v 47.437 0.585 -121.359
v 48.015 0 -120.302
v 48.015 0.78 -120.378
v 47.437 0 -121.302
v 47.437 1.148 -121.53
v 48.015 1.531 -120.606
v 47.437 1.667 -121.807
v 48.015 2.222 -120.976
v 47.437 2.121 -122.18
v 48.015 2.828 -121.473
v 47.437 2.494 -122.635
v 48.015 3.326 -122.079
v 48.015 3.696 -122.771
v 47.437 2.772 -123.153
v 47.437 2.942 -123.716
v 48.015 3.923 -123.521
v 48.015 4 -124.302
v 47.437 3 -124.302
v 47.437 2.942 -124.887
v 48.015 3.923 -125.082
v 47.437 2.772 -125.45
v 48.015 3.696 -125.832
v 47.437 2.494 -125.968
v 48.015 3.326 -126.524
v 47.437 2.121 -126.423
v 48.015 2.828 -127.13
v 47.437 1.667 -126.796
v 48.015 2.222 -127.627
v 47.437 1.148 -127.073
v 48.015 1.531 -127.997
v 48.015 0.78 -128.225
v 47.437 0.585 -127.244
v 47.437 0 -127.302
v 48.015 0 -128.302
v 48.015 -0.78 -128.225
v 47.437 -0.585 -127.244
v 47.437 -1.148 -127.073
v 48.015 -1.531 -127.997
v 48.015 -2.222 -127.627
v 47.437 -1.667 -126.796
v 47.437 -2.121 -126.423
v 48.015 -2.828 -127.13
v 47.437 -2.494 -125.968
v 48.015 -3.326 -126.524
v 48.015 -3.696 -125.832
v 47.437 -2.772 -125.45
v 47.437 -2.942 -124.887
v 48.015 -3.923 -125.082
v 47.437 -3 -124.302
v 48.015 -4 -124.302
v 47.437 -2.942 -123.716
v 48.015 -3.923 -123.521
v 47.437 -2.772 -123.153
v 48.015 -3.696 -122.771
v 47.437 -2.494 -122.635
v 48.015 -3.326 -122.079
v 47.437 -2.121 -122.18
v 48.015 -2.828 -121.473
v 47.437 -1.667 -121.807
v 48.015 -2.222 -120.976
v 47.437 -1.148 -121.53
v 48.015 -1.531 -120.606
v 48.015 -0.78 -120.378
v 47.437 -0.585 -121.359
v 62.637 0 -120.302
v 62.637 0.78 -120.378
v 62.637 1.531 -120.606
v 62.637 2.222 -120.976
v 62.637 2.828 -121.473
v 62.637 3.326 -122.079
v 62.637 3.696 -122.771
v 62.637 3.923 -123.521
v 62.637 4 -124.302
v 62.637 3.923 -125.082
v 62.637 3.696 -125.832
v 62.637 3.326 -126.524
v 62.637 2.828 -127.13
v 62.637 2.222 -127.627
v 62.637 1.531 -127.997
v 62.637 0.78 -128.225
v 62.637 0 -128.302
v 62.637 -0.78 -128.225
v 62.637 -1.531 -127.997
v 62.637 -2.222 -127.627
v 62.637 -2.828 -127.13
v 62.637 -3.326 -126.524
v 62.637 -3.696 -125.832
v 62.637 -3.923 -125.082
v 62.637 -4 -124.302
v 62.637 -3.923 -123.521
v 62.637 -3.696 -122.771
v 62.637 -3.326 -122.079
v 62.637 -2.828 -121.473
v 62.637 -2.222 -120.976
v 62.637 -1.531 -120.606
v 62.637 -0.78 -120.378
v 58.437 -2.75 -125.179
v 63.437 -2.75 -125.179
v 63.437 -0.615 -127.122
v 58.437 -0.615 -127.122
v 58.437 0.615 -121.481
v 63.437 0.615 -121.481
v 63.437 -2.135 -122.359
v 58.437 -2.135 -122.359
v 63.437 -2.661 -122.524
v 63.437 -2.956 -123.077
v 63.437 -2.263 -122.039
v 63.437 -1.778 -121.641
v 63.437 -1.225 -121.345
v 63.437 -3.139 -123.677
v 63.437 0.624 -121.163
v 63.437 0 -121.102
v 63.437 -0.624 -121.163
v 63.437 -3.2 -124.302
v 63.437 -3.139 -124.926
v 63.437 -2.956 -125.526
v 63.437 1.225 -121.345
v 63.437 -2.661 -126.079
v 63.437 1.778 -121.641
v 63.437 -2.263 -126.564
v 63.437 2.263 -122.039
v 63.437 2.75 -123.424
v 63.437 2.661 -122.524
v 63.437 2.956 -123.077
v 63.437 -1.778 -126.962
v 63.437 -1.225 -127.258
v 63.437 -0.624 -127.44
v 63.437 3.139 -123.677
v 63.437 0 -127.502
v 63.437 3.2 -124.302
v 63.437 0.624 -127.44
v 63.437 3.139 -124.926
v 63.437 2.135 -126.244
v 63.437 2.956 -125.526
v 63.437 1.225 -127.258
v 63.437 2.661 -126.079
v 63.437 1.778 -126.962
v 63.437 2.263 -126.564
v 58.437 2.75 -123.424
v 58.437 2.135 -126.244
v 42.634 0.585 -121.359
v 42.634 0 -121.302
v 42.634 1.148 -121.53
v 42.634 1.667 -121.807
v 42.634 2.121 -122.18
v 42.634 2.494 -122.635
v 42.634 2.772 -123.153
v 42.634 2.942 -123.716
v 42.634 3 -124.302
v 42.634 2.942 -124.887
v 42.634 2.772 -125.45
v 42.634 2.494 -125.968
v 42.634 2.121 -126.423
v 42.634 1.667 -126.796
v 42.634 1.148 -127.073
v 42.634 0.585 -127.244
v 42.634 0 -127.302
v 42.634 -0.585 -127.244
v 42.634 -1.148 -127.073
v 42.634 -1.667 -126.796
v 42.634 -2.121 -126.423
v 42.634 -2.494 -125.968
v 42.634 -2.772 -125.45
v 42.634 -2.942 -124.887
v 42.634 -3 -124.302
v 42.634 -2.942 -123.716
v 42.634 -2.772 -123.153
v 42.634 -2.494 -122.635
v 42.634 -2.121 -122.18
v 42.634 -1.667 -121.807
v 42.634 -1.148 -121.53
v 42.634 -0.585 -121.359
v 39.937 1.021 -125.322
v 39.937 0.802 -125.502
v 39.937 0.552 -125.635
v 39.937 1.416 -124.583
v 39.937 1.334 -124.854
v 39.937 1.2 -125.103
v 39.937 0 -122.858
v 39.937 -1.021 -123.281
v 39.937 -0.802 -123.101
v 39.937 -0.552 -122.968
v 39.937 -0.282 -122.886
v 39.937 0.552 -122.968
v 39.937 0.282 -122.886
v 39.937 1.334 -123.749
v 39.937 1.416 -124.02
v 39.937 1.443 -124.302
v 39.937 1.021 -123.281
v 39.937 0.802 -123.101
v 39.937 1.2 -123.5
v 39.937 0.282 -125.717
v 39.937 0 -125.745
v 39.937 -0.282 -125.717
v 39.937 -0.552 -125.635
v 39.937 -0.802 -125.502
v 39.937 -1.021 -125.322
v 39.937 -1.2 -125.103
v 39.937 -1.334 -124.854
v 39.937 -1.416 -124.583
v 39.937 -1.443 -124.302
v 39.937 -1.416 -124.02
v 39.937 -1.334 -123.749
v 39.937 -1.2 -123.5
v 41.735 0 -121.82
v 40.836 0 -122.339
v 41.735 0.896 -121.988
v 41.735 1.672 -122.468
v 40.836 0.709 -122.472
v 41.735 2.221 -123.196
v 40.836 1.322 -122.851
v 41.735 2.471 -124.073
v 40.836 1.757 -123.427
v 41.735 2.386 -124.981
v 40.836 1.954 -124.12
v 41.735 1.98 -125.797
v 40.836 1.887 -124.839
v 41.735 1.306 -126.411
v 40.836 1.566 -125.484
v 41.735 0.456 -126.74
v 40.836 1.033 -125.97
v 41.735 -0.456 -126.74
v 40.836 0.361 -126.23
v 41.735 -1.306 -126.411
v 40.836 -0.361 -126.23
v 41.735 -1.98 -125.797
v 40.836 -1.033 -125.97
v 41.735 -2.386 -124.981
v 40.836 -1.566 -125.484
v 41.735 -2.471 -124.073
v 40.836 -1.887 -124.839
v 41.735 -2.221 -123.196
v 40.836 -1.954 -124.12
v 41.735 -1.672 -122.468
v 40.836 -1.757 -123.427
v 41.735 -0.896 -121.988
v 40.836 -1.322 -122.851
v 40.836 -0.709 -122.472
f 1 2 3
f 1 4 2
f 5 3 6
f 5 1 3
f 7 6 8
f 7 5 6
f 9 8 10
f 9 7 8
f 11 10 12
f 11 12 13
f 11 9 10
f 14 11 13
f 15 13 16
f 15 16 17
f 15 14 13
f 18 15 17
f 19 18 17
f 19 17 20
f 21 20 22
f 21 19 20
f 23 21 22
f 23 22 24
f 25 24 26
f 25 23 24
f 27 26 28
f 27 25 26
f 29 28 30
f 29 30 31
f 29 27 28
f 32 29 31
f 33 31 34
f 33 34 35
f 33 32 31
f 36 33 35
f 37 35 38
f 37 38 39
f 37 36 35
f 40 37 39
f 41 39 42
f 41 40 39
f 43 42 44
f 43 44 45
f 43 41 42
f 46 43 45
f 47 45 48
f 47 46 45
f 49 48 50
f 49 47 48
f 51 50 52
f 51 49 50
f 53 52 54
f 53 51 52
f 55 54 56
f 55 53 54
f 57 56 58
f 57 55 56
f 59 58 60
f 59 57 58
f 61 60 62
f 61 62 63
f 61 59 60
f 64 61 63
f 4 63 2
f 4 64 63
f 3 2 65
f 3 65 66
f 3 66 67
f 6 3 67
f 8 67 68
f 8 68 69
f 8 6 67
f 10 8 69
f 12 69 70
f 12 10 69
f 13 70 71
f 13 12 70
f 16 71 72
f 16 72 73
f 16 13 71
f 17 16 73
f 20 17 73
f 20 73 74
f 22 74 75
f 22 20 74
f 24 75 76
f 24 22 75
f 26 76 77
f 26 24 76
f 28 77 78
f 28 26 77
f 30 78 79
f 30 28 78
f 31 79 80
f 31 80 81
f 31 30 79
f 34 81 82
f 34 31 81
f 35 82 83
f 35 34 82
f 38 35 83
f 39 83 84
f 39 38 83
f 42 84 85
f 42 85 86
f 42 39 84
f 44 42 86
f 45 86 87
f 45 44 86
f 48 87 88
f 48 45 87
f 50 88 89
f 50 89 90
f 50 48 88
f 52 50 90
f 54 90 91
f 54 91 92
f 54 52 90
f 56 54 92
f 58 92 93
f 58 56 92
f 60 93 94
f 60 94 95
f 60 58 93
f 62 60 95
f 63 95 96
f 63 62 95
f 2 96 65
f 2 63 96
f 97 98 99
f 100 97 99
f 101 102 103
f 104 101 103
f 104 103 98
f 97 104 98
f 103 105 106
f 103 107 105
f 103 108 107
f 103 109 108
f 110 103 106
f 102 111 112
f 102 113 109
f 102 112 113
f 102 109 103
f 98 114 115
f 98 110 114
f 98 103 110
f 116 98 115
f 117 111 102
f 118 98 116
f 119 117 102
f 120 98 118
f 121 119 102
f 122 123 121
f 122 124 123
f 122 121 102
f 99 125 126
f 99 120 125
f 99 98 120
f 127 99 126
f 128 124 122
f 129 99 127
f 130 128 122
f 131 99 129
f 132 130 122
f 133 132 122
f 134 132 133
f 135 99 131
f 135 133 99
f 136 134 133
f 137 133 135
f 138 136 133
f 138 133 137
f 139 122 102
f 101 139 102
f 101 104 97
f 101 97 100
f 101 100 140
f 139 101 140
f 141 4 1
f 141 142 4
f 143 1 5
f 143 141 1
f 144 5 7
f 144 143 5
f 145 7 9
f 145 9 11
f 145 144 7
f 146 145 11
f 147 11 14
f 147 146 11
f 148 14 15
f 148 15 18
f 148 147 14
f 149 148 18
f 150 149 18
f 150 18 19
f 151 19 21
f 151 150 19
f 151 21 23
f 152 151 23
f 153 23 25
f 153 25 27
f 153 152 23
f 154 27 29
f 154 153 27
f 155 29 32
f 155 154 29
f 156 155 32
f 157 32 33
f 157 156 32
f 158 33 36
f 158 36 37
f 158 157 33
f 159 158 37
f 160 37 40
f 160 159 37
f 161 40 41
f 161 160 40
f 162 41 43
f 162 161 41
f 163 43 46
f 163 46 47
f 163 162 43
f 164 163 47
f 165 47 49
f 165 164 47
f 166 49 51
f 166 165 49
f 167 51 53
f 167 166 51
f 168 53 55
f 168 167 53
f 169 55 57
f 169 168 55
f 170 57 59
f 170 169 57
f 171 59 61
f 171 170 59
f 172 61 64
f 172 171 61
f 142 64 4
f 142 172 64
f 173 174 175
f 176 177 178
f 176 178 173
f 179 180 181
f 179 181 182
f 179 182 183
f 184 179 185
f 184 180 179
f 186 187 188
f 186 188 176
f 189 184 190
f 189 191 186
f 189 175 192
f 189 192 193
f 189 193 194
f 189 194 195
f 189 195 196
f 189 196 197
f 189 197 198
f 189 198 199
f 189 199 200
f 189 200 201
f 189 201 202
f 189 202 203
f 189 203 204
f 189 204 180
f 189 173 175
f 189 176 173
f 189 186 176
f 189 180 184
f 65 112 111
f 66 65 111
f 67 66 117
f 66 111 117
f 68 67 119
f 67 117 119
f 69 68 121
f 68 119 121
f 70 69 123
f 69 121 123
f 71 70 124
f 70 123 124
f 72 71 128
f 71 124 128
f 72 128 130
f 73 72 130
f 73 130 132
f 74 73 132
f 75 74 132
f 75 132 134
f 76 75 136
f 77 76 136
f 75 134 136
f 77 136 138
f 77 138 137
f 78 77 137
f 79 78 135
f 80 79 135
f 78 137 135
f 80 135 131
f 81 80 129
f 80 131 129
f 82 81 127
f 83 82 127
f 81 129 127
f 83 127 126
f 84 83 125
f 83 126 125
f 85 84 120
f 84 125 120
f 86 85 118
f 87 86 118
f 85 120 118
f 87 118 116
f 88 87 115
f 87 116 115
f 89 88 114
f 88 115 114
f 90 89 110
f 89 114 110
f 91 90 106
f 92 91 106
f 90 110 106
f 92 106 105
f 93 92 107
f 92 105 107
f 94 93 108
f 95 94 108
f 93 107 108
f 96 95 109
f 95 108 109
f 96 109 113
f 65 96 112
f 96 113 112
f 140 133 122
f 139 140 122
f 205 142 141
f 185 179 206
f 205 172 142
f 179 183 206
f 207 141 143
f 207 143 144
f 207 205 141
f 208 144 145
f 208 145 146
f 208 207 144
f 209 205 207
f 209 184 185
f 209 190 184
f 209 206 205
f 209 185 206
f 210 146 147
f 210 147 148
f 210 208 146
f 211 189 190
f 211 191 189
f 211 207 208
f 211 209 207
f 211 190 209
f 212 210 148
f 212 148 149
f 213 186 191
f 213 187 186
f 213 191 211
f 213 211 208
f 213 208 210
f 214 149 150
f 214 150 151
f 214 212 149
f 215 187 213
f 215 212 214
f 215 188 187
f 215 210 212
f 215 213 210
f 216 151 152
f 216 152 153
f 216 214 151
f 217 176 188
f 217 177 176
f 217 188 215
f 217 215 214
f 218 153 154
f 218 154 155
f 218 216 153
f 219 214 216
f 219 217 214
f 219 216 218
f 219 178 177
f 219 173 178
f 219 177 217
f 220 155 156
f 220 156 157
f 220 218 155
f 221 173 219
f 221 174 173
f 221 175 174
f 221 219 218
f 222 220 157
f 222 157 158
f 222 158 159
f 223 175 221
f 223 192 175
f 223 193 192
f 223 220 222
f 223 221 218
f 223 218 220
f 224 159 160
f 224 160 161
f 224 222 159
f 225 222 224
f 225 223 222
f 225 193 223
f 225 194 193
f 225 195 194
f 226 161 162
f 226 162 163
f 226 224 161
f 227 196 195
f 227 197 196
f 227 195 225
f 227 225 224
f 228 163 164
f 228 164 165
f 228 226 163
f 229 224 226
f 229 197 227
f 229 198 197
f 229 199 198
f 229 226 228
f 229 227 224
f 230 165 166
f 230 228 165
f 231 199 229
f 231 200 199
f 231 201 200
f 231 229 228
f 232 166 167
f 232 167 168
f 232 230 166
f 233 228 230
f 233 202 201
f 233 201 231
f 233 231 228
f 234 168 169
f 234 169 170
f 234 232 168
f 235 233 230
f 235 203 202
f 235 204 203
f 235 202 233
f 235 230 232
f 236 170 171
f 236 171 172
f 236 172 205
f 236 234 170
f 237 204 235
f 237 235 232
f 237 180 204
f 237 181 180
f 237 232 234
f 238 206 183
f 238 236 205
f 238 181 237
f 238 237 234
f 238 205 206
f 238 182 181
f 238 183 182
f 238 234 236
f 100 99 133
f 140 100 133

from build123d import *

# Parameters (mm, degrees)
F3_DEPTH = 5
F4_SIZE  = 0.8


with BuildPart() as f1:
    # F0 (on Front) → F1 (revolve)
    with BuildSketch(Plane.XZ):
        Polygon((42.6336441377, -121.3015150939), (39.937491715, -122.8581394209), (39.937491715, -124.3015150939), (63.437491715, -124.3015150939), (63.437491715, -120.3015150939), (48.0148419841, -120.3015150939), (47.437491715, -121.3015150939), align=None)
    revolve(axis=Axis((51.687491715, 0, -124.3015150939), (-1, 0, 0)))

    # F2 (on face) → F3 (cut)
    with BuildSketch(Plane.YZ.offset(63.437491715)):
        Polygon((2.7500788948, -123.423791102), (0.6149081729, -121.4810149127), (-2.1351707219, -122.3587389045), (-2.7500788948, -125.1792390858), (-0.6149081729, -127.1220152751), (2.1351707219, -126.2442912832), align=None)
    extrude(amount=-F3_DEPTH, mode=Mode.SUBTRACT)

    # F4
    f4_edges = [f1.edges().sort_by_distance(p)[0] for p in [
        (63.437492, 0, -128.301515),
    ]]
    chamfer(f4_edges, length=F4_SIZE)


solid = f1.part
